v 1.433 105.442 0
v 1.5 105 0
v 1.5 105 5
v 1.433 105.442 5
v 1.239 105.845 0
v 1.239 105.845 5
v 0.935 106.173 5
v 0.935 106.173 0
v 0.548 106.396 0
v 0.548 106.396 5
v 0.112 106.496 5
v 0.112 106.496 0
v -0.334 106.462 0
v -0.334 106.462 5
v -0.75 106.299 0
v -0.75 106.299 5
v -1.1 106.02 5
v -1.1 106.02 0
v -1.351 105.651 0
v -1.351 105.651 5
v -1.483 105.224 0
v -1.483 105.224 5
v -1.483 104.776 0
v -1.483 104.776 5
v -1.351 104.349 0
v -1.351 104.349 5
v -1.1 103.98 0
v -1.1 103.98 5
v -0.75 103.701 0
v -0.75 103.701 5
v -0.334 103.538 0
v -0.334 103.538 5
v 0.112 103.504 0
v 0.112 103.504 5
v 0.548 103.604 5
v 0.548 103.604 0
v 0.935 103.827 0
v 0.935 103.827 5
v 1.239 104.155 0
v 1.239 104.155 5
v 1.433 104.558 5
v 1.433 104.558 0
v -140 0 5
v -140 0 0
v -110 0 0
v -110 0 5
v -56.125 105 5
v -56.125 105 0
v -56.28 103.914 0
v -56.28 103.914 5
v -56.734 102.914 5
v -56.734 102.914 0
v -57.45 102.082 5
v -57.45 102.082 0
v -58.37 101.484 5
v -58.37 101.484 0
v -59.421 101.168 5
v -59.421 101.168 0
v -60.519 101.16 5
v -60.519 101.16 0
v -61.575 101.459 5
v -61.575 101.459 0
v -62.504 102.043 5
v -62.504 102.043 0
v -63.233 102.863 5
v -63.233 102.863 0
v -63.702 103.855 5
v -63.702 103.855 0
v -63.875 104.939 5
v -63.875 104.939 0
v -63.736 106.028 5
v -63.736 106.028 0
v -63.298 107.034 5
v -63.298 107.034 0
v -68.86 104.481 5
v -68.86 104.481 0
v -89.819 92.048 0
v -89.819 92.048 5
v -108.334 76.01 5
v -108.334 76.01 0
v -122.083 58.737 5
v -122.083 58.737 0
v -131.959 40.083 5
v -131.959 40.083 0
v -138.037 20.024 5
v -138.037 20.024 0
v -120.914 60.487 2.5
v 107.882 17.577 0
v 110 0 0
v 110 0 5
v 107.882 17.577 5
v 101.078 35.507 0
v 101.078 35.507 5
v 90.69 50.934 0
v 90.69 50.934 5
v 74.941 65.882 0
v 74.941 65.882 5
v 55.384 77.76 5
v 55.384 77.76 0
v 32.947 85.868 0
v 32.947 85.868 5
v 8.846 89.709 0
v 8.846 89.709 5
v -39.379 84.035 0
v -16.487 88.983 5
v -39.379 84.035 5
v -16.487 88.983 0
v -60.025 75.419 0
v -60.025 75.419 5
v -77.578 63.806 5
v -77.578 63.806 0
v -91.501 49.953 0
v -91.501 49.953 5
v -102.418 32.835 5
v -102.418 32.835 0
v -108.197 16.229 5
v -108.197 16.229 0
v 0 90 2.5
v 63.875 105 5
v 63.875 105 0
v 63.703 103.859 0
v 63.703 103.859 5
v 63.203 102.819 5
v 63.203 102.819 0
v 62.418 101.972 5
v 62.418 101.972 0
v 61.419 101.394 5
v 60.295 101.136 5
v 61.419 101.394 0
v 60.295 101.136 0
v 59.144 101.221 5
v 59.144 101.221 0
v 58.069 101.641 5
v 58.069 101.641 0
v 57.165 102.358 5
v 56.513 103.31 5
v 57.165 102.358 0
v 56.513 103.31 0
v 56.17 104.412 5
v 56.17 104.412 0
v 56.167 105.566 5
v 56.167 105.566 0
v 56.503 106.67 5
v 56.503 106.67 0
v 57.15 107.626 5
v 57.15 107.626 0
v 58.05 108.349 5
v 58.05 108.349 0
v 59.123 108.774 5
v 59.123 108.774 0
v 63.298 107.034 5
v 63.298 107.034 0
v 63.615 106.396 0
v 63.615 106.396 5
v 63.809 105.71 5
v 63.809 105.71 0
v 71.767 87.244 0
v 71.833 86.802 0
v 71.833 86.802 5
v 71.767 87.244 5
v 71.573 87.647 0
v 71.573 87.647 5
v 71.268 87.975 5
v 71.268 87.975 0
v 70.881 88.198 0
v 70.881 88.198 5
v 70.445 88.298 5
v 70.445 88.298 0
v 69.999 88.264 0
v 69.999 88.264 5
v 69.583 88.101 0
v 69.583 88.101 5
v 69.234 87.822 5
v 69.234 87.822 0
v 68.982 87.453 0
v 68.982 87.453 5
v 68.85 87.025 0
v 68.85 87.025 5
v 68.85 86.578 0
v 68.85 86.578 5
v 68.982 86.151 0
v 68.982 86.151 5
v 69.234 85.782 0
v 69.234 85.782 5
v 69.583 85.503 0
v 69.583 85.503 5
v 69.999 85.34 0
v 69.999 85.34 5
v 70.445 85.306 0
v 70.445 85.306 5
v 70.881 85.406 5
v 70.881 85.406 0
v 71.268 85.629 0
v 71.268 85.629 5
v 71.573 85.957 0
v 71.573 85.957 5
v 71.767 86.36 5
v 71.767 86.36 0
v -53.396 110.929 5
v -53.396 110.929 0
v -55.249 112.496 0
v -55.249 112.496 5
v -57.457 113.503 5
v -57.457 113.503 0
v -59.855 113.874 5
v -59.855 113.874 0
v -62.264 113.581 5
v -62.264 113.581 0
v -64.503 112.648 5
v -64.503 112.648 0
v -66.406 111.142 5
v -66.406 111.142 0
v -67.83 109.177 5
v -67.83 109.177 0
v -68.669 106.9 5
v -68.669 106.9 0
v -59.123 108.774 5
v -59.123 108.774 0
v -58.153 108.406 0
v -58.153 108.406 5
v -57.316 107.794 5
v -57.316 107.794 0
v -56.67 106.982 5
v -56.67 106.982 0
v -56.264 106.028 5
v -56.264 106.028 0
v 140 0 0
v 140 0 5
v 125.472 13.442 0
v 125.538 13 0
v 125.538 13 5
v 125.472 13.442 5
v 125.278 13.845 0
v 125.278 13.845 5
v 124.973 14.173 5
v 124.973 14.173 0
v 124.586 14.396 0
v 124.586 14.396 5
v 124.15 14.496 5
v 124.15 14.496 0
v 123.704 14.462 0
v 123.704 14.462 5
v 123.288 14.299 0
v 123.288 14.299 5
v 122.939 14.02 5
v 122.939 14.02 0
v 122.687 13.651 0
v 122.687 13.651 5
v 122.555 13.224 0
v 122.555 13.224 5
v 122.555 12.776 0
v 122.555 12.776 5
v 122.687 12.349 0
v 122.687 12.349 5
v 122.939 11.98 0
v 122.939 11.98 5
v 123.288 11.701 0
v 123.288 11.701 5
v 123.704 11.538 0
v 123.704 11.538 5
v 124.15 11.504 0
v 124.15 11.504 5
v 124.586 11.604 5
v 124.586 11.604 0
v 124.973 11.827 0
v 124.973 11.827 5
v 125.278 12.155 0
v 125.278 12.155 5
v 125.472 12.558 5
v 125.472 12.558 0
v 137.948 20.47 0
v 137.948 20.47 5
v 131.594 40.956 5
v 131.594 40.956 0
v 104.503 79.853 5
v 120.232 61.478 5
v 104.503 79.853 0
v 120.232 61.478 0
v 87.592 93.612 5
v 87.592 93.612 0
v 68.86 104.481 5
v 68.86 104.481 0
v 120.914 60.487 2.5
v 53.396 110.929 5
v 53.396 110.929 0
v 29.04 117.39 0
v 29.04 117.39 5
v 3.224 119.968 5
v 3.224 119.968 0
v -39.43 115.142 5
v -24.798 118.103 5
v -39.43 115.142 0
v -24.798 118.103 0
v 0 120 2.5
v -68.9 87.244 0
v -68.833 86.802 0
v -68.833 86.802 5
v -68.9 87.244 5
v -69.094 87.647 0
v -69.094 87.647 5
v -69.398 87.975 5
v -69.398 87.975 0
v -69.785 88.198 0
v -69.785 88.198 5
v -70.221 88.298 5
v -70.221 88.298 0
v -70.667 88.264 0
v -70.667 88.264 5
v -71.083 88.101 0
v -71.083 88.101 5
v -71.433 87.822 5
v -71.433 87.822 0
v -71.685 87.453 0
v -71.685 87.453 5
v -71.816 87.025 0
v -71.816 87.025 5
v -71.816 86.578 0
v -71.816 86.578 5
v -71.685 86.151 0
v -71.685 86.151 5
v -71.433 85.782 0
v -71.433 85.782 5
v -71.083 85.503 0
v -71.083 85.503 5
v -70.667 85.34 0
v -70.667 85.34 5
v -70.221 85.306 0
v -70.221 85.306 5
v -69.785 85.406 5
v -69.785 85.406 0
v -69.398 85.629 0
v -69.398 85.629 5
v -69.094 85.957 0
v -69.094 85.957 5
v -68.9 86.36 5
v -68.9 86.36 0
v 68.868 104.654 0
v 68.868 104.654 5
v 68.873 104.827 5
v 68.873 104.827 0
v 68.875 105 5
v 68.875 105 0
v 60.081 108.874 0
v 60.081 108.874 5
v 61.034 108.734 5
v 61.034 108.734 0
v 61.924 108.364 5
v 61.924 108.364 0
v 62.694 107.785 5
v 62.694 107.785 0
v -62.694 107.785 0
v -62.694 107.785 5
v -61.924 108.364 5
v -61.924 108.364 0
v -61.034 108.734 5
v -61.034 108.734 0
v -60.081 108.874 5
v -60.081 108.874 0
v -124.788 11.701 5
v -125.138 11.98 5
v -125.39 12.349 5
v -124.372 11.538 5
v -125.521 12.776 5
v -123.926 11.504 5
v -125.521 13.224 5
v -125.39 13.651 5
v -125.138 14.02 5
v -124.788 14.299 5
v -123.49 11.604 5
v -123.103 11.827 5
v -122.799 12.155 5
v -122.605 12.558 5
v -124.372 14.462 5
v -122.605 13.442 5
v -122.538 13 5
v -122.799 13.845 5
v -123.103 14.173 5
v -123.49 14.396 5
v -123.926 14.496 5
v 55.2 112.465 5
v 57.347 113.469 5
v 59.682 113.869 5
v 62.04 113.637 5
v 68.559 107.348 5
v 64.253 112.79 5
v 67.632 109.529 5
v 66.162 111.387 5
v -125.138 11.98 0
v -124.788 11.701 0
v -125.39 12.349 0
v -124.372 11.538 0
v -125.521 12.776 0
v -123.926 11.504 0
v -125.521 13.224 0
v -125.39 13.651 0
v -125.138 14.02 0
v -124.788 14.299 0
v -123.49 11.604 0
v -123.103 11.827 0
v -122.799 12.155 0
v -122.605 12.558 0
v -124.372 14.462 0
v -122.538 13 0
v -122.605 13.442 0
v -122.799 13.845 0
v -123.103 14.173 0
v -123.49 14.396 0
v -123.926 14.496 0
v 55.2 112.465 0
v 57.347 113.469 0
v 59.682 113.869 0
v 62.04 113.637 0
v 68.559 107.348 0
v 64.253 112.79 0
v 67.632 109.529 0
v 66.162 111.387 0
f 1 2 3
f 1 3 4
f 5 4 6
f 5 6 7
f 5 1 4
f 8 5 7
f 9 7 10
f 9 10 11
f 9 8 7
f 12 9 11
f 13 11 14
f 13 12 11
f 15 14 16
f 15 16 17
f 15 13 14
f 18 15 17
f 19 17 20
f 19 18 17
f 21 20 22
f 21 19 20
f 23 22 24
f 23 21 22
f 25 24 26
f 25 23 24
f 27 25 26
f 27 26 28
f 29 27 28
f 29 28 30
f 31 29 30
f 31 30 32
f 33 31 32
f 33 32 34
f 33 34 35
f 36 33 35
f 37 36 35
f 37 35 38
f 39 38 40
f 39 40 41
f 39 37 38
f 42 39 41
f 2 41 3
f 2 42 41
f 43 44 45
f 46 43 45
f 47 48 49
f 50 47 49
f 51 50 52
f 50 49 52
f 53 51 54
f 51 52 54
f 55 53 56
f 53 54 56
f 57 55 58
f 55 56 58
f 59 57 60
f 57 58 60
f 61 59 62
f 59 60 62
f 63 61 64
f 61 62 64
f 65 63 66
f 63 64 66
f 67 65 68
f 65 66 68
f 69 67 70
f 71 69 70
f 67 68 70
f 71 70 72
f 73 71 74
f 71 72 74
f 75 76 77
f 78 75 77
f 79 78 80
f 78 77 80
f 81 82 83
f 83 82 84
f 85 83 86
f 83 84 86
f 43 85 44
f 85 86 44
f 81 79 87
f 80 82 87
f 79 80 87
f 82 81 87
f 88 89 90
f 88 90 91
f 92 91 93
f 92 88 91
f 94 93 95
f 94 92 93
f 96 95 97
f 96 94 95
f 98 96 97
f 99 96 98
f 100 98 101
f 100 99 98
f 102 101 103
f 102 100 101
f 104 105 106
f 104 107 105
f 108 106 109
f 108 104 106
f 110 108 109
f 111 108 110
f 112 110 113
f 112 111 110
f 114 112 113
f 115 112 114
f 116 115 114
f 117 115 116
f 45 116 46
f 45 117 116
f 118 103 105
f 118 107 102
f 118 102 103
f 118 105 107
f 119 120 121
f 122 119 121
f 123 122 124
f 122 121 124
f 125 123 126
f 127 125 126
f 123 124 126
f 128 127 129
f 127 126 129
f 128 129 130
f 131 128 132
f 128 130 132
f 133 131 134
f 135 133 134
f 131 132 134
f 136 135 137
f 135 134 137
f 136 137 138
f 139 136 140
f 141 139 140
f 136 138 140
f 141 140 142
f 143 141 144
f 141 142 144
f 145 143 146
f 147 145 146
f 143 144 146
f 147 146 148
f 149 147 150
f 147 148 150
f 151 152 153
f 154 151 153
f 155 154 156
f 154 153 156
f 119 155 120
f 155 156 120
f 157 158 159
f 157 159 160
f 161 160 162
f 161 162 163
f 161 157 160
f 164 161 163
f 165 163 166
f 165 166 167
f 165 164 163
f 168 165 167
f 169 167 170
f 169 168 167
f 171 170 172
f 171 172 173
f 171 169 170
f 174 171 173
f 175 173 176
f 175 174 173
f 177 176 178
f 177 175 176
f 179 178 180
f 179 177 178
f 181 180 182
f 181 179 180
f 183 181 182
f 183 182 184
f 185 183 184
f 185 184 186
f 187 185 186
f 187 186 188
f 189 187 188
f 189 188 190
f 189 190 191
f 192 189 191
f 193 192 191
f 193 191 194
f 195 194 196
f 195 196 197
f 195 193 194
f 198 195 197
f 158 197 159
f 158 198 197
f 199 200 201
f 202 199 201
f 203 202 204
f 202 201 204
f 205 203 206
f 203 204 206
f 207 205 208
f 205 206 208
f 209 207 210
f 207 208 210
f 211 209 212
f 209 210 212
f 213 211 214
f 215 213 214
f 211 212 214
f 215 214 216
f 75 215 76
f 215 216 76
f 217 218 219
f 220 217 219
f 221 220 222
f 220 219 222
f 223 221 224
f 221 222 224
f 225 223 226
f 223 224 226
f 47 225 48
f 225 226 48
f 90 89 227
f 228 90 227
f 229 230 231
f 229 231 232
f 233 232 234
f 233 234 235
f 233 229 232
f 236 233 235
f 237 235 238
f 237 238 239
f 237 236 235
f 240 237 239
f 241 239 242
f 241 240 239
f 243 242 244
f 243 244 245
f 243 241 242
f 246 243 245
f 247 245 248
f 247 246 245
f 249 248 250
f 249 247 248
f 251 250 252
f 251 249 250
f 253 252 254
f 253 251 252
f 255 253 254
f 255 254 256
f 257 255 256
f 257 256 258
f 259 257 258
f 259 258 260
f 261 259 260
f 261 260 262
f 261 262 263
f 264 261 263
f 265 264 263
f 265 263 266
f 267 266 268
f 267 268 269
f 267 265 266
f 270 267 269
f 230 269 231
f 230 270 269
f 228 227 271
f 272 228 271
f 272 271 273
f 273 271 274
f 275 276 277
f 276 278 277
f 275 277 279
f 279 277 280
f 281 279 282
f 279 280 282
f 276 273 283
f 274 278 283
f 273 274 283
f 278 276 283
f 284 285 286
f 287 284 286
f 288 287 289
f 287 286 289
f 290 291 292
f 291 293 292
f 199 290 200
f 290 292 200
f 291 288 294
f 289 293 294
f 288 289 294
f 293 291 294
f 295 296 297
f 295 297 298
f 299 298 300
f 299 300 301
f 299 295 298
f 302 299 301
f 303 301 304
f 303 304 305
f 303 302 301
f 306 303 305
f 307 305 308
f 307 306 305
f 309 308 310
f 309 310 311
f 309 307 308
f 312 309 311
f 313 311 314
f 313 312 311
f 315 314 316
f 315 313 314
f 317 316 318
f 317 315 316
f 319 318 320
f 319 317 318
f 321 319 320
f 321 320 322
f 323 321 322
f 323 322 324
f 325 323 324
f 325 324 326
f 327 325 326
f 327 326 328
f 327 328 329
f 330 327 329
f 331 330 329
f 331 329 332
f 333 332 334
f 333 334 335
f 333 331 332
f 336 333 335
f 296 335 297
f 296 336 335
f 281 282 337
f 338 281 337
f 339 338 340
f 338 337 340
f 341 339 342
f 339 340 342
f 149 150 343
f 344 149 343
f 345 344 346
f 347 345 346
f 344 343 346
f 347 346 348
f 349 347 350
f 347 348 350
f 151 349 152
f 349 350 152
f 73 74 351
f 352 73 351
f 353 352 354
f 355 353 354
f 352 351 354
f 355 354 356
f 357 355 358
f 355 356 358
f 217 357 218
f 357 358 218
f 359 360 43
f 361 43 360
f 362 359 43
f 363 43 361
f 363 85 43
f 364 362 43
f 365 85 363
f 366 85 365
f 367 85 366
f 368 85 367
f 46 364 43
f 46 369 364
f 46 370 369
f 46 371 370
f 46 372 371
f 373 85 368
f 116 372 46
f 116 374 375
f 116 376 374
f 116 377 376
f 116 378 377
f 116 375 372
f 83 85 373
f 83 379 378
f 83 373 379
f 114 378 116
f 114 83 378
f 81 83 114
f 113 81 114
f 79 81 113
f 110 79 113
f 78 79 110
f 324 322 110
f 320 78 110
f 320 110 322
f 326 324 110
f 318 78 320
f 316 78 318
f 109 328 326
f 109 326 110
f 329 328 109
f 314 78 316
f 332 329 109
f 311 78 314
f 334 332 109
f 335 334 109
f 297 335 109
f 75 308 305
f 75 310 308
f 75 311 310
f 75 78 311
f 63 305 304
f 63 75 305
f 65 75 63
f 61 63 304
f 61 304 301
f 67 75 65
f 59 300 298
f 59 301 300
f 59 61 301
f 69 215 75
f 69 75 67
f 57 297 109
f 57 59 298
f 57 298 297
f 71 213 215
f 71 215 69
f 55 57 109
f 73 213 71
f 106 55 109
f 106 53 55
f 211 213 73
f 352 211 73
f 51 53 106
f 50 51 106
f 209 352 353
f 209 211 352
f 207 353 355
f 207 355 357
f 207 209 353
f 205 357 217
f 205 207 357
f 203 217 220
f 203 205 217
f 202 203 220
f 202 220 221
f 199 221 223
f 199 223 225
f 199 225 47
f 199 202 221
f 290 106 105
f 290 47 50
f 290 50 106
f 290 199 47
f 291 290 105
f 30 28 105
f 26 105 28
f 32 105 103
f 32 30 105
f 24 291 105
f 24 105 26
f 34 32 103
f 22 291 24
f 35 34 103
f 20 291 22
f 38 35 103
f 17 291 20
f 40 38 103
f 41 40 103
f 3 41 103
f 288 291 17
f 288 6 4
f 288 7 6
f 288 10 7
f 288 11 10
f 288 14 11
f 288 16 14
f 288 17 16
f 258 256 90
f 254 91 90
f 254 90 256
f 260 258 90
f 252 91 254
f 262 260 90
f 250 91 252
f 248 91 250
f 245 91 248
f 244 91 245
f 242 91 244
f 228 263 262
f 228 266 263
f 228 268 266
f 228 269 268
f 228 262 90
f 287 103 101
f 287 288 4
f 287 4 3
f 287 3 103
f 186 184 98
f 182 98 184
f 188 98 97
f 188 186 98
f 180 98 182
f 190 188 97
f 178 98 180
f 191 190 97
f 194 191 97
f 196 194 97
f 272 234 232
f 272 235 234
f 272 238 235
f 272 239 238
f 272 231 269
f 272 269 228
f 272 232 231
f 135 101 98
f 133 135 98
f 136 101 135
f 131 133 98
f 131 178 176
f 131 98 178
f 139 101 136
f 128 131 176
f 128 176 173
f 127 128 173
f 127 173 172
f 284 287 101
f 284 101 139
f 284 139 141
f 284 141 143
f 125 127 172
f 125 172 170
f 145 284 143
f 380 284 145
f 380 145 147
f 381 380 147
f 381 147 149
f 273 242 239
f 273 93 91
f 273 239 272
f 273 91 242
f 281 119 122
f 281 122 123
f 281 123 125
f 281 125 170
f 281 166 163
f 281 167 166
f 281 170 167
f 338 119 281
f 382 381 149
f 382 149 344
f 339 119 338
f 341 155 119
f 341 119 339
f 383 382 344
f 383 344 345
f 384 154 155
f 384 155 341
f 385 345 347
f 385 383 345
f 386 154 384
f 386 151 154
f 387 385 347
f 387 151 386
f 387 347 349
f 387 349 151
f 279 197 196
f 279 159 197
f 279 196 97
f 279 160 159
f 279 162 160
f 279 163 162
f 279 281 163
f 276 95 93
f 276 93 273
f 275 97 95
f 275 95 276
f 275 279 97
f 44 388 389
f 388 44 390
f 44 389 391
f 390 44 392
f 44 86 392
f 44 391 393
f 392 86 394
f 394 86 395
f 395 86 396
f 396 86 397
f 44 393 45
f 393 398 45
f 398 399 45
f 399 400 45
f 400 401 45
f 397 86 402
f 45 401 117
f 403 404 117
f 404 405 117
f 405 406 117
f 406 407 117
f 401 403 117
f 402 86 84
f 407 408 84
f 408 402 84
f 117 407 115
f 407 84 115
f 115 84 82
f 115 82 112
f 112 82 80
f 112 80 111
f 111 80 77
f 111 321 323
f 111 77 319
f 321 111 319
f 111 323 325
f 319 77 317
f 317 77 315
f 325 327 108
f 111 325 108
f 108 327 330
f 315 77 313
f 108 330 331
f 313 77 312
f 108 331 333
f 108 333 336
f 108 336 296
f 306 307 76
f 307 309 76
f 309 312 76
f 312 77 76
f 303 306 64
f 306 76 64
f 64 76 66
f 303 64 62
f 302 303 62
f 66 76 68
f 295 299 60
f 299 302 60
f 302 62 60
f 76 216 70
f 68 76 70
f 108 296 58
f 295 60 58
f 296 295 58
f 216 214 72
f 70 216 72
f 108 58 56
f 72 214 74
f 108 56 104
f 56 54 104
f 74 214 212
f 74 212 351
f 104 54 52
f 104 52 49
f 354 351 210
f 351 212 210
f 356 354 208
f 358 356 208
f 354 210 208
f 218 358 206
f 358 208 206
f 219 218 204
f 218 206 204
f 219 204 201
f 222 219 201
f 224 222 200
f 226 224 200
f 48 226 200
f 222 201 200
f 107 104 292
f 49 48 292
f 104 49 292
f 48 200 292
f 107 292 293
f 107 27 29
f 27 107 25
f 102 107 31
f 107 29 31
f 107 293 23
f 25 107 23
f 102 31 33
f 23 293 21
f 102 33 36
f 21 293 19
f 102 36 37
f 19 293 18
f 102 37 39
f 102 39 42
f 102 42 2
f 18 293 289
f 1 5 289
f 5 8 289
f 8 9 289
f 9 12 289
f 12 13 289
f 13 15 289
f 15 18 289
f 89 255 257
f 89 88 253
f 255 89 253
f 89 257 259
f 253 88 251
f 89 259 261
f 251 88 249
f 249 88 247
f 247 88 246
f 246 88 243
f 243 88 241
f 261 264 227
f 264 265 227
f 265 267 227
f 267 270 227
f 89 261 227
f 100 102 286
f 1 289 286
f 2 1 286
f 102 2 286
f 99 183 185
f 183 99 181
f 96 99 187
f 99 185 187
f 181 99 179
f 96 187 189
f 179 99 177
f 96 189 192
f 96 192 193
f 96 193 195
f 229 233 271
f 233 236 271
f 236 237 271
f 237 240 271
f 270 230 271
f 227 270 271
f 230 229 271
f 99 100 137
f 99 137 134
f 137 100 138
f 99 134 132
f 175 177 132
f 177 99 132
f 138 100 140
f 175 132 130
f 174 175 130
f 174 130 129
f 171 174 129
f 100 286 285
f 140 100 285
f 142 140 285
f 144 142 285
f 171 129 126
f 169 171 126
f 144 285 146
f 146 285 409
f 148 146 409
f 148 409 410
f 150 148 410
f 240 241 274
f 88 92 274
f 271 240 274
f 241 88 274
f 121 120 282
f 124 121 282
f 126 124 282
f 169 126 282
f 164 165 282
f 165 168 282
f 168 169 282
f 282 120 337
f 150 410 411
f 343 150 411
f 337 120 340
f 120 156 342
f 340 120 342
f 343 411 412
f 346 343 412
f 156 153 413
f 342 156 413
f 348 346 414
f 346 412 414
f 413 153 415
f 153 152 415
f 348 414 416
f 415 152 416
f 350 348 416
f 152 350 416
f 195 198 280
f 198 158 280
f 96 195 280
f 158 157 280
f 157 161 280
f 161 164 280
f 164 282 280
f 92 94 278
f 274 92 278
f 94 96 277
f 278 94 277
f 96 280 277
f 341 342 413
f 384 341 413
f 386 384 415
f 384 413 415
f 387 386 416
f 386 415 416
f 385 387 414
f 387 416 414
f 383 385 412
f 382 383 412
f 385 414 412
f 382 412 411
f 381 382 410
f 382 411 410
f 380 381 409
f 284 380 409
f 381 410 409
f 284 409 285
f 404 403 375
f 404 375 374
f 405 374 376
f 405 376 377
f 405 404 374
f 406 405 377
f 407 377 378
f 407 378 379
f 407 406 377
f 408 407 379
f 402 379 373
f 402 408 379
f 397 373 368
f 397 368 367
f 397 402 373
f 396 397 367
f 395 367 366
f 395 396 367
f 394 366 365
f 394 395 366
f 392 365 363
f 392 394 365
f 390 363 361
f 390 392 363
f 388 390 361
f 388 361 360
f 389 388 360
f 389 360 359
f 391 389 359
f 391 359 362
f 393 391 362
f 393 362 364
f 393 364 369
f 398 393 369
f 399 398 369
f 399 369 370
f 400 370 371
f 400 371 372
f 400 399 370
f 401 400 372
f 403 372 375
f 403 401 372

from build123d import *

# Parameters (mm, degrees)
F0_R     = 1.5
F1_DEPTH = 5


# Not quite as in the source:
# - a feature names something its author has since deleted; it is built from what else it names


with BuildPart() as f1:
    # F0 (on Top) → F1 (new body)
    with BuildSketch(Plane.XY):
        with BuildLine():
            ThreePointArc((-53.3961581093, 110.9291565406), (-63.4156131399, 113.1914108601), (-68.8598231895, 104.4811955556))
            add(Edge.make_bspline(
                [(-63.2980641383, 107.0343052721), (-66.1125104261, 105.8114732046), (-68.8598231895, 104.4811955556)],
                knots=[2.0399471573, 2.0399471573, 2.0399471573, 2.0850163371, 2.0850163371, 2.0850163371], degree=2, weights=[1, 0.9997461069, 1]))
            ThreePointArc((-63.2980641383, 107.0343052721), (-61.4906892533, 108.5767961292), (-59.1228145122, 108.7744099698))
            add(Edge.make_bspline(
                [(-53.3961581093, 110.9291565406), (-56.2875684522, 109.9066162001), (-59.1228145122, 108.7744099698)],
                knots=[1.962107852, 1.962107852, 1.962107852, 2.0067839239, 2.0067839239, 2.0067839239], degree=2, weights=[1, 0.9997505164, 1]))
        make_face()
        with BuildLine():
            add(Edge.make_bspline(
                [(-63.2980641383, 107.0343052721), (-66.1125104261, 105.8114732046), (-68.8598231895, 104.4811955556)],
                knots=[2.0399471573, 2.0399471573, 2.0399471573, 2.0850163371, 2.0850163371, 2.0850163371], degree=2, weights=[1, 0.9997461069, 1]))
            ThreePointArc((-68.8598231895, 104.4811955556), (-59.7404868081, 96.128795014), (-51.125, 105))
            ThreePointArc((-51.125, 105), (-51.7122161654, 108.1746281846), (-53.3961581093, 110.9291565406))
            add(Edge.make_bspline(
                [(-53.3961581093, 110.9291565406), (-56.2875684522, 109.9066162001), (-59.1228145122, 108.7744099698)],
                knots=[1.962107852, 1.962107852, 1.962107852, 2.0067839239, 2.0067839239, 2.0067839239], degree=2, weights=[1, 0.9997505164, 1]))
            ThreePointArc((-59.1228145122, 108.7744099698), (-56.9656369066, 107.4100343602), (-56.125, 105))
            ThreePointArc((-56.125, 105), (-61.0572668689, 101.2720230999), (-63.2980641383, 107.0343052721))
        make_face()
        with BuildLine():
            add(Edge.make_bspline(
                [(-68.8598231895, 104.4811955556), (-140, 70.0343759485), (-140, 0)],
                knots=[2.0850163371, 2.0850163371, 2.0850163371, 3.1415926536, 3.1415926536, 3.1415926536], degree=2, weights=[1, 0.863671199, 1]))
            Line((-140, 0), (-110, 0))
            add(Edge.make_bspline(
                [(110, 0), (110, 90), (0, 90), (-110, 90), (-110, 0)],
                knots=[0, 0, 0, 1.5707963268, 1.5707963268, 3.1415926536, 3.1415926536, 3.1415926536], degree=2, weights=[1, 0.7071067812, 1, 0.7071067812, 1]))
            Line((110, 0), (140, 0))
            add(Edge.make_bspline(
                [(140, 0), (140, 70.0343759485), (68.8598231895, 104.4811955556)],
                knots=[0, 0, 0, 1.0565763165, 1.0565763165, 1.0565763165], degree=2, weights=[1, 0.863671199, 1]))
            ThreePointArc((68.8598231895, 104.4811955556), (56.5843868601, 96.8085891399), (53.3961581093, 110.9291565406))
            add(Edge.make_bspline(
                [(53.3961581093, 110.9291565406), (0, 129.81257993), (-53.3961581093, 110.9291565406)],
                knots=[1.1794848016, 1.1794848016, 1.1794848016, 1.962107852, 1.962107852, 1.962107852], degree=2, weights=[1, 0.9244096378, 1]))
            ThreePointArc((-53.3961581093, 110.9291565406), (-51.7122161654, 108.1746281846), (-51.125, 105))
            ThreePointArc((-51.125, 105), (-59.7404868081, 96.128795014), (-68.8598231895, 104.4811955556))
        make_face()
        with Locations((-124.0382502632, 13)):
            Circle(F0_R, mode=Mode.SUBTRACT)
        with Locations((-70.333152659, 86.8019097296)):
            Circle(F0_R, mode=Mode.SUBTRACT)
        with Locations((124.0382502632, 13)):
            Circle(F0_R, mode=Mode.SUBTRACT)
        with Locations((0, 105)):
            Circle(F0_R, mode=Mode.SUBTRACT)
        with Locations((70.333152659, 86.8019097296)):
            Circle(F0_R, mode=Mode.SUBTRACT)
        with BuildLine():
            add(Edge.make_bspline(
                [(68.8598231895, 104.4811955556), (66.1125104261, 105.8114732046), (63.2980641383, 107.0343052721)],
                knots=[1.0565763165, 1.0565763165, 1.0565763165, 1.1016454963, 1.1016454963, 1.1016454963], degree=2, weights=[1, 0.9997461069, 1]))
            ThreePointArc((68.8598231895, 104.4811955556), (68.871204986, 104.7404868081), (68.875, 105))
            ThreePointArc((68.875, 105), (63.1746281846, 113.2877838346), (53.3961581093, 110.9291565406))
            add(Edge.make_bspline(
                [(59.1228145122, 108.7744099698), (56.2875684522, 109.9066162001), (53.3961581093, 110.9291565406)],
                knots=[1.1348087297, 1.1348087297, 1.1348087297, 1.1794848016, 1.1794848016, 1.1794848016], degree=2, weights=[1, 0.9997505164, 1]))
            ThreePointArc((59.1228145122, 108.7744099698), (61.4906892533, 108.5767961292), (63.2980641383, 107.0343052721))
        make_face()
        with BuildLine():
            ThreePointArc((53.3961581093, 110.9291565406), (56.5843868601, 96.8085891399), (68.8598231895, 104.4811955556))
            add(Edge.make_bspline(
                [(68.8598231895, 104.4811955556), (66.1125104261, 105.8114732046), (63.2980641383, 107.0343052721)],
                knots=[1.0565763165, 1.0565763165, 1.0565763165, 1.1016454963, 1.1016454963, 1.1016454963], degree=2, weights=[1, 0.9997461069, 1]))
            ThreePointArc((63.2980641383, 107.0343052721), (63.7279769001, 106.0572668689), (63.875, 105))
            ThreePointArc((63.875, 105), (57.5899656398, 101.9656369066), (59.1228145122, 108.7744099698))
            add(Edge.make_bspline(
                [(59.1228145122, 108.7744099698), (56.2875684522, 109.9066162001), (53.3961581093, 110.9291565406)],
                knots=[1.1348087297, 1.1348087297, 1.1348087297, 1.1794848016, 1.1794848016, 1.1794848016], degree=2, weights=[1, 0.9997505164, 1]))
        make_face()
    extrude(amount=F1_DEPTH)


solid = f1.part
